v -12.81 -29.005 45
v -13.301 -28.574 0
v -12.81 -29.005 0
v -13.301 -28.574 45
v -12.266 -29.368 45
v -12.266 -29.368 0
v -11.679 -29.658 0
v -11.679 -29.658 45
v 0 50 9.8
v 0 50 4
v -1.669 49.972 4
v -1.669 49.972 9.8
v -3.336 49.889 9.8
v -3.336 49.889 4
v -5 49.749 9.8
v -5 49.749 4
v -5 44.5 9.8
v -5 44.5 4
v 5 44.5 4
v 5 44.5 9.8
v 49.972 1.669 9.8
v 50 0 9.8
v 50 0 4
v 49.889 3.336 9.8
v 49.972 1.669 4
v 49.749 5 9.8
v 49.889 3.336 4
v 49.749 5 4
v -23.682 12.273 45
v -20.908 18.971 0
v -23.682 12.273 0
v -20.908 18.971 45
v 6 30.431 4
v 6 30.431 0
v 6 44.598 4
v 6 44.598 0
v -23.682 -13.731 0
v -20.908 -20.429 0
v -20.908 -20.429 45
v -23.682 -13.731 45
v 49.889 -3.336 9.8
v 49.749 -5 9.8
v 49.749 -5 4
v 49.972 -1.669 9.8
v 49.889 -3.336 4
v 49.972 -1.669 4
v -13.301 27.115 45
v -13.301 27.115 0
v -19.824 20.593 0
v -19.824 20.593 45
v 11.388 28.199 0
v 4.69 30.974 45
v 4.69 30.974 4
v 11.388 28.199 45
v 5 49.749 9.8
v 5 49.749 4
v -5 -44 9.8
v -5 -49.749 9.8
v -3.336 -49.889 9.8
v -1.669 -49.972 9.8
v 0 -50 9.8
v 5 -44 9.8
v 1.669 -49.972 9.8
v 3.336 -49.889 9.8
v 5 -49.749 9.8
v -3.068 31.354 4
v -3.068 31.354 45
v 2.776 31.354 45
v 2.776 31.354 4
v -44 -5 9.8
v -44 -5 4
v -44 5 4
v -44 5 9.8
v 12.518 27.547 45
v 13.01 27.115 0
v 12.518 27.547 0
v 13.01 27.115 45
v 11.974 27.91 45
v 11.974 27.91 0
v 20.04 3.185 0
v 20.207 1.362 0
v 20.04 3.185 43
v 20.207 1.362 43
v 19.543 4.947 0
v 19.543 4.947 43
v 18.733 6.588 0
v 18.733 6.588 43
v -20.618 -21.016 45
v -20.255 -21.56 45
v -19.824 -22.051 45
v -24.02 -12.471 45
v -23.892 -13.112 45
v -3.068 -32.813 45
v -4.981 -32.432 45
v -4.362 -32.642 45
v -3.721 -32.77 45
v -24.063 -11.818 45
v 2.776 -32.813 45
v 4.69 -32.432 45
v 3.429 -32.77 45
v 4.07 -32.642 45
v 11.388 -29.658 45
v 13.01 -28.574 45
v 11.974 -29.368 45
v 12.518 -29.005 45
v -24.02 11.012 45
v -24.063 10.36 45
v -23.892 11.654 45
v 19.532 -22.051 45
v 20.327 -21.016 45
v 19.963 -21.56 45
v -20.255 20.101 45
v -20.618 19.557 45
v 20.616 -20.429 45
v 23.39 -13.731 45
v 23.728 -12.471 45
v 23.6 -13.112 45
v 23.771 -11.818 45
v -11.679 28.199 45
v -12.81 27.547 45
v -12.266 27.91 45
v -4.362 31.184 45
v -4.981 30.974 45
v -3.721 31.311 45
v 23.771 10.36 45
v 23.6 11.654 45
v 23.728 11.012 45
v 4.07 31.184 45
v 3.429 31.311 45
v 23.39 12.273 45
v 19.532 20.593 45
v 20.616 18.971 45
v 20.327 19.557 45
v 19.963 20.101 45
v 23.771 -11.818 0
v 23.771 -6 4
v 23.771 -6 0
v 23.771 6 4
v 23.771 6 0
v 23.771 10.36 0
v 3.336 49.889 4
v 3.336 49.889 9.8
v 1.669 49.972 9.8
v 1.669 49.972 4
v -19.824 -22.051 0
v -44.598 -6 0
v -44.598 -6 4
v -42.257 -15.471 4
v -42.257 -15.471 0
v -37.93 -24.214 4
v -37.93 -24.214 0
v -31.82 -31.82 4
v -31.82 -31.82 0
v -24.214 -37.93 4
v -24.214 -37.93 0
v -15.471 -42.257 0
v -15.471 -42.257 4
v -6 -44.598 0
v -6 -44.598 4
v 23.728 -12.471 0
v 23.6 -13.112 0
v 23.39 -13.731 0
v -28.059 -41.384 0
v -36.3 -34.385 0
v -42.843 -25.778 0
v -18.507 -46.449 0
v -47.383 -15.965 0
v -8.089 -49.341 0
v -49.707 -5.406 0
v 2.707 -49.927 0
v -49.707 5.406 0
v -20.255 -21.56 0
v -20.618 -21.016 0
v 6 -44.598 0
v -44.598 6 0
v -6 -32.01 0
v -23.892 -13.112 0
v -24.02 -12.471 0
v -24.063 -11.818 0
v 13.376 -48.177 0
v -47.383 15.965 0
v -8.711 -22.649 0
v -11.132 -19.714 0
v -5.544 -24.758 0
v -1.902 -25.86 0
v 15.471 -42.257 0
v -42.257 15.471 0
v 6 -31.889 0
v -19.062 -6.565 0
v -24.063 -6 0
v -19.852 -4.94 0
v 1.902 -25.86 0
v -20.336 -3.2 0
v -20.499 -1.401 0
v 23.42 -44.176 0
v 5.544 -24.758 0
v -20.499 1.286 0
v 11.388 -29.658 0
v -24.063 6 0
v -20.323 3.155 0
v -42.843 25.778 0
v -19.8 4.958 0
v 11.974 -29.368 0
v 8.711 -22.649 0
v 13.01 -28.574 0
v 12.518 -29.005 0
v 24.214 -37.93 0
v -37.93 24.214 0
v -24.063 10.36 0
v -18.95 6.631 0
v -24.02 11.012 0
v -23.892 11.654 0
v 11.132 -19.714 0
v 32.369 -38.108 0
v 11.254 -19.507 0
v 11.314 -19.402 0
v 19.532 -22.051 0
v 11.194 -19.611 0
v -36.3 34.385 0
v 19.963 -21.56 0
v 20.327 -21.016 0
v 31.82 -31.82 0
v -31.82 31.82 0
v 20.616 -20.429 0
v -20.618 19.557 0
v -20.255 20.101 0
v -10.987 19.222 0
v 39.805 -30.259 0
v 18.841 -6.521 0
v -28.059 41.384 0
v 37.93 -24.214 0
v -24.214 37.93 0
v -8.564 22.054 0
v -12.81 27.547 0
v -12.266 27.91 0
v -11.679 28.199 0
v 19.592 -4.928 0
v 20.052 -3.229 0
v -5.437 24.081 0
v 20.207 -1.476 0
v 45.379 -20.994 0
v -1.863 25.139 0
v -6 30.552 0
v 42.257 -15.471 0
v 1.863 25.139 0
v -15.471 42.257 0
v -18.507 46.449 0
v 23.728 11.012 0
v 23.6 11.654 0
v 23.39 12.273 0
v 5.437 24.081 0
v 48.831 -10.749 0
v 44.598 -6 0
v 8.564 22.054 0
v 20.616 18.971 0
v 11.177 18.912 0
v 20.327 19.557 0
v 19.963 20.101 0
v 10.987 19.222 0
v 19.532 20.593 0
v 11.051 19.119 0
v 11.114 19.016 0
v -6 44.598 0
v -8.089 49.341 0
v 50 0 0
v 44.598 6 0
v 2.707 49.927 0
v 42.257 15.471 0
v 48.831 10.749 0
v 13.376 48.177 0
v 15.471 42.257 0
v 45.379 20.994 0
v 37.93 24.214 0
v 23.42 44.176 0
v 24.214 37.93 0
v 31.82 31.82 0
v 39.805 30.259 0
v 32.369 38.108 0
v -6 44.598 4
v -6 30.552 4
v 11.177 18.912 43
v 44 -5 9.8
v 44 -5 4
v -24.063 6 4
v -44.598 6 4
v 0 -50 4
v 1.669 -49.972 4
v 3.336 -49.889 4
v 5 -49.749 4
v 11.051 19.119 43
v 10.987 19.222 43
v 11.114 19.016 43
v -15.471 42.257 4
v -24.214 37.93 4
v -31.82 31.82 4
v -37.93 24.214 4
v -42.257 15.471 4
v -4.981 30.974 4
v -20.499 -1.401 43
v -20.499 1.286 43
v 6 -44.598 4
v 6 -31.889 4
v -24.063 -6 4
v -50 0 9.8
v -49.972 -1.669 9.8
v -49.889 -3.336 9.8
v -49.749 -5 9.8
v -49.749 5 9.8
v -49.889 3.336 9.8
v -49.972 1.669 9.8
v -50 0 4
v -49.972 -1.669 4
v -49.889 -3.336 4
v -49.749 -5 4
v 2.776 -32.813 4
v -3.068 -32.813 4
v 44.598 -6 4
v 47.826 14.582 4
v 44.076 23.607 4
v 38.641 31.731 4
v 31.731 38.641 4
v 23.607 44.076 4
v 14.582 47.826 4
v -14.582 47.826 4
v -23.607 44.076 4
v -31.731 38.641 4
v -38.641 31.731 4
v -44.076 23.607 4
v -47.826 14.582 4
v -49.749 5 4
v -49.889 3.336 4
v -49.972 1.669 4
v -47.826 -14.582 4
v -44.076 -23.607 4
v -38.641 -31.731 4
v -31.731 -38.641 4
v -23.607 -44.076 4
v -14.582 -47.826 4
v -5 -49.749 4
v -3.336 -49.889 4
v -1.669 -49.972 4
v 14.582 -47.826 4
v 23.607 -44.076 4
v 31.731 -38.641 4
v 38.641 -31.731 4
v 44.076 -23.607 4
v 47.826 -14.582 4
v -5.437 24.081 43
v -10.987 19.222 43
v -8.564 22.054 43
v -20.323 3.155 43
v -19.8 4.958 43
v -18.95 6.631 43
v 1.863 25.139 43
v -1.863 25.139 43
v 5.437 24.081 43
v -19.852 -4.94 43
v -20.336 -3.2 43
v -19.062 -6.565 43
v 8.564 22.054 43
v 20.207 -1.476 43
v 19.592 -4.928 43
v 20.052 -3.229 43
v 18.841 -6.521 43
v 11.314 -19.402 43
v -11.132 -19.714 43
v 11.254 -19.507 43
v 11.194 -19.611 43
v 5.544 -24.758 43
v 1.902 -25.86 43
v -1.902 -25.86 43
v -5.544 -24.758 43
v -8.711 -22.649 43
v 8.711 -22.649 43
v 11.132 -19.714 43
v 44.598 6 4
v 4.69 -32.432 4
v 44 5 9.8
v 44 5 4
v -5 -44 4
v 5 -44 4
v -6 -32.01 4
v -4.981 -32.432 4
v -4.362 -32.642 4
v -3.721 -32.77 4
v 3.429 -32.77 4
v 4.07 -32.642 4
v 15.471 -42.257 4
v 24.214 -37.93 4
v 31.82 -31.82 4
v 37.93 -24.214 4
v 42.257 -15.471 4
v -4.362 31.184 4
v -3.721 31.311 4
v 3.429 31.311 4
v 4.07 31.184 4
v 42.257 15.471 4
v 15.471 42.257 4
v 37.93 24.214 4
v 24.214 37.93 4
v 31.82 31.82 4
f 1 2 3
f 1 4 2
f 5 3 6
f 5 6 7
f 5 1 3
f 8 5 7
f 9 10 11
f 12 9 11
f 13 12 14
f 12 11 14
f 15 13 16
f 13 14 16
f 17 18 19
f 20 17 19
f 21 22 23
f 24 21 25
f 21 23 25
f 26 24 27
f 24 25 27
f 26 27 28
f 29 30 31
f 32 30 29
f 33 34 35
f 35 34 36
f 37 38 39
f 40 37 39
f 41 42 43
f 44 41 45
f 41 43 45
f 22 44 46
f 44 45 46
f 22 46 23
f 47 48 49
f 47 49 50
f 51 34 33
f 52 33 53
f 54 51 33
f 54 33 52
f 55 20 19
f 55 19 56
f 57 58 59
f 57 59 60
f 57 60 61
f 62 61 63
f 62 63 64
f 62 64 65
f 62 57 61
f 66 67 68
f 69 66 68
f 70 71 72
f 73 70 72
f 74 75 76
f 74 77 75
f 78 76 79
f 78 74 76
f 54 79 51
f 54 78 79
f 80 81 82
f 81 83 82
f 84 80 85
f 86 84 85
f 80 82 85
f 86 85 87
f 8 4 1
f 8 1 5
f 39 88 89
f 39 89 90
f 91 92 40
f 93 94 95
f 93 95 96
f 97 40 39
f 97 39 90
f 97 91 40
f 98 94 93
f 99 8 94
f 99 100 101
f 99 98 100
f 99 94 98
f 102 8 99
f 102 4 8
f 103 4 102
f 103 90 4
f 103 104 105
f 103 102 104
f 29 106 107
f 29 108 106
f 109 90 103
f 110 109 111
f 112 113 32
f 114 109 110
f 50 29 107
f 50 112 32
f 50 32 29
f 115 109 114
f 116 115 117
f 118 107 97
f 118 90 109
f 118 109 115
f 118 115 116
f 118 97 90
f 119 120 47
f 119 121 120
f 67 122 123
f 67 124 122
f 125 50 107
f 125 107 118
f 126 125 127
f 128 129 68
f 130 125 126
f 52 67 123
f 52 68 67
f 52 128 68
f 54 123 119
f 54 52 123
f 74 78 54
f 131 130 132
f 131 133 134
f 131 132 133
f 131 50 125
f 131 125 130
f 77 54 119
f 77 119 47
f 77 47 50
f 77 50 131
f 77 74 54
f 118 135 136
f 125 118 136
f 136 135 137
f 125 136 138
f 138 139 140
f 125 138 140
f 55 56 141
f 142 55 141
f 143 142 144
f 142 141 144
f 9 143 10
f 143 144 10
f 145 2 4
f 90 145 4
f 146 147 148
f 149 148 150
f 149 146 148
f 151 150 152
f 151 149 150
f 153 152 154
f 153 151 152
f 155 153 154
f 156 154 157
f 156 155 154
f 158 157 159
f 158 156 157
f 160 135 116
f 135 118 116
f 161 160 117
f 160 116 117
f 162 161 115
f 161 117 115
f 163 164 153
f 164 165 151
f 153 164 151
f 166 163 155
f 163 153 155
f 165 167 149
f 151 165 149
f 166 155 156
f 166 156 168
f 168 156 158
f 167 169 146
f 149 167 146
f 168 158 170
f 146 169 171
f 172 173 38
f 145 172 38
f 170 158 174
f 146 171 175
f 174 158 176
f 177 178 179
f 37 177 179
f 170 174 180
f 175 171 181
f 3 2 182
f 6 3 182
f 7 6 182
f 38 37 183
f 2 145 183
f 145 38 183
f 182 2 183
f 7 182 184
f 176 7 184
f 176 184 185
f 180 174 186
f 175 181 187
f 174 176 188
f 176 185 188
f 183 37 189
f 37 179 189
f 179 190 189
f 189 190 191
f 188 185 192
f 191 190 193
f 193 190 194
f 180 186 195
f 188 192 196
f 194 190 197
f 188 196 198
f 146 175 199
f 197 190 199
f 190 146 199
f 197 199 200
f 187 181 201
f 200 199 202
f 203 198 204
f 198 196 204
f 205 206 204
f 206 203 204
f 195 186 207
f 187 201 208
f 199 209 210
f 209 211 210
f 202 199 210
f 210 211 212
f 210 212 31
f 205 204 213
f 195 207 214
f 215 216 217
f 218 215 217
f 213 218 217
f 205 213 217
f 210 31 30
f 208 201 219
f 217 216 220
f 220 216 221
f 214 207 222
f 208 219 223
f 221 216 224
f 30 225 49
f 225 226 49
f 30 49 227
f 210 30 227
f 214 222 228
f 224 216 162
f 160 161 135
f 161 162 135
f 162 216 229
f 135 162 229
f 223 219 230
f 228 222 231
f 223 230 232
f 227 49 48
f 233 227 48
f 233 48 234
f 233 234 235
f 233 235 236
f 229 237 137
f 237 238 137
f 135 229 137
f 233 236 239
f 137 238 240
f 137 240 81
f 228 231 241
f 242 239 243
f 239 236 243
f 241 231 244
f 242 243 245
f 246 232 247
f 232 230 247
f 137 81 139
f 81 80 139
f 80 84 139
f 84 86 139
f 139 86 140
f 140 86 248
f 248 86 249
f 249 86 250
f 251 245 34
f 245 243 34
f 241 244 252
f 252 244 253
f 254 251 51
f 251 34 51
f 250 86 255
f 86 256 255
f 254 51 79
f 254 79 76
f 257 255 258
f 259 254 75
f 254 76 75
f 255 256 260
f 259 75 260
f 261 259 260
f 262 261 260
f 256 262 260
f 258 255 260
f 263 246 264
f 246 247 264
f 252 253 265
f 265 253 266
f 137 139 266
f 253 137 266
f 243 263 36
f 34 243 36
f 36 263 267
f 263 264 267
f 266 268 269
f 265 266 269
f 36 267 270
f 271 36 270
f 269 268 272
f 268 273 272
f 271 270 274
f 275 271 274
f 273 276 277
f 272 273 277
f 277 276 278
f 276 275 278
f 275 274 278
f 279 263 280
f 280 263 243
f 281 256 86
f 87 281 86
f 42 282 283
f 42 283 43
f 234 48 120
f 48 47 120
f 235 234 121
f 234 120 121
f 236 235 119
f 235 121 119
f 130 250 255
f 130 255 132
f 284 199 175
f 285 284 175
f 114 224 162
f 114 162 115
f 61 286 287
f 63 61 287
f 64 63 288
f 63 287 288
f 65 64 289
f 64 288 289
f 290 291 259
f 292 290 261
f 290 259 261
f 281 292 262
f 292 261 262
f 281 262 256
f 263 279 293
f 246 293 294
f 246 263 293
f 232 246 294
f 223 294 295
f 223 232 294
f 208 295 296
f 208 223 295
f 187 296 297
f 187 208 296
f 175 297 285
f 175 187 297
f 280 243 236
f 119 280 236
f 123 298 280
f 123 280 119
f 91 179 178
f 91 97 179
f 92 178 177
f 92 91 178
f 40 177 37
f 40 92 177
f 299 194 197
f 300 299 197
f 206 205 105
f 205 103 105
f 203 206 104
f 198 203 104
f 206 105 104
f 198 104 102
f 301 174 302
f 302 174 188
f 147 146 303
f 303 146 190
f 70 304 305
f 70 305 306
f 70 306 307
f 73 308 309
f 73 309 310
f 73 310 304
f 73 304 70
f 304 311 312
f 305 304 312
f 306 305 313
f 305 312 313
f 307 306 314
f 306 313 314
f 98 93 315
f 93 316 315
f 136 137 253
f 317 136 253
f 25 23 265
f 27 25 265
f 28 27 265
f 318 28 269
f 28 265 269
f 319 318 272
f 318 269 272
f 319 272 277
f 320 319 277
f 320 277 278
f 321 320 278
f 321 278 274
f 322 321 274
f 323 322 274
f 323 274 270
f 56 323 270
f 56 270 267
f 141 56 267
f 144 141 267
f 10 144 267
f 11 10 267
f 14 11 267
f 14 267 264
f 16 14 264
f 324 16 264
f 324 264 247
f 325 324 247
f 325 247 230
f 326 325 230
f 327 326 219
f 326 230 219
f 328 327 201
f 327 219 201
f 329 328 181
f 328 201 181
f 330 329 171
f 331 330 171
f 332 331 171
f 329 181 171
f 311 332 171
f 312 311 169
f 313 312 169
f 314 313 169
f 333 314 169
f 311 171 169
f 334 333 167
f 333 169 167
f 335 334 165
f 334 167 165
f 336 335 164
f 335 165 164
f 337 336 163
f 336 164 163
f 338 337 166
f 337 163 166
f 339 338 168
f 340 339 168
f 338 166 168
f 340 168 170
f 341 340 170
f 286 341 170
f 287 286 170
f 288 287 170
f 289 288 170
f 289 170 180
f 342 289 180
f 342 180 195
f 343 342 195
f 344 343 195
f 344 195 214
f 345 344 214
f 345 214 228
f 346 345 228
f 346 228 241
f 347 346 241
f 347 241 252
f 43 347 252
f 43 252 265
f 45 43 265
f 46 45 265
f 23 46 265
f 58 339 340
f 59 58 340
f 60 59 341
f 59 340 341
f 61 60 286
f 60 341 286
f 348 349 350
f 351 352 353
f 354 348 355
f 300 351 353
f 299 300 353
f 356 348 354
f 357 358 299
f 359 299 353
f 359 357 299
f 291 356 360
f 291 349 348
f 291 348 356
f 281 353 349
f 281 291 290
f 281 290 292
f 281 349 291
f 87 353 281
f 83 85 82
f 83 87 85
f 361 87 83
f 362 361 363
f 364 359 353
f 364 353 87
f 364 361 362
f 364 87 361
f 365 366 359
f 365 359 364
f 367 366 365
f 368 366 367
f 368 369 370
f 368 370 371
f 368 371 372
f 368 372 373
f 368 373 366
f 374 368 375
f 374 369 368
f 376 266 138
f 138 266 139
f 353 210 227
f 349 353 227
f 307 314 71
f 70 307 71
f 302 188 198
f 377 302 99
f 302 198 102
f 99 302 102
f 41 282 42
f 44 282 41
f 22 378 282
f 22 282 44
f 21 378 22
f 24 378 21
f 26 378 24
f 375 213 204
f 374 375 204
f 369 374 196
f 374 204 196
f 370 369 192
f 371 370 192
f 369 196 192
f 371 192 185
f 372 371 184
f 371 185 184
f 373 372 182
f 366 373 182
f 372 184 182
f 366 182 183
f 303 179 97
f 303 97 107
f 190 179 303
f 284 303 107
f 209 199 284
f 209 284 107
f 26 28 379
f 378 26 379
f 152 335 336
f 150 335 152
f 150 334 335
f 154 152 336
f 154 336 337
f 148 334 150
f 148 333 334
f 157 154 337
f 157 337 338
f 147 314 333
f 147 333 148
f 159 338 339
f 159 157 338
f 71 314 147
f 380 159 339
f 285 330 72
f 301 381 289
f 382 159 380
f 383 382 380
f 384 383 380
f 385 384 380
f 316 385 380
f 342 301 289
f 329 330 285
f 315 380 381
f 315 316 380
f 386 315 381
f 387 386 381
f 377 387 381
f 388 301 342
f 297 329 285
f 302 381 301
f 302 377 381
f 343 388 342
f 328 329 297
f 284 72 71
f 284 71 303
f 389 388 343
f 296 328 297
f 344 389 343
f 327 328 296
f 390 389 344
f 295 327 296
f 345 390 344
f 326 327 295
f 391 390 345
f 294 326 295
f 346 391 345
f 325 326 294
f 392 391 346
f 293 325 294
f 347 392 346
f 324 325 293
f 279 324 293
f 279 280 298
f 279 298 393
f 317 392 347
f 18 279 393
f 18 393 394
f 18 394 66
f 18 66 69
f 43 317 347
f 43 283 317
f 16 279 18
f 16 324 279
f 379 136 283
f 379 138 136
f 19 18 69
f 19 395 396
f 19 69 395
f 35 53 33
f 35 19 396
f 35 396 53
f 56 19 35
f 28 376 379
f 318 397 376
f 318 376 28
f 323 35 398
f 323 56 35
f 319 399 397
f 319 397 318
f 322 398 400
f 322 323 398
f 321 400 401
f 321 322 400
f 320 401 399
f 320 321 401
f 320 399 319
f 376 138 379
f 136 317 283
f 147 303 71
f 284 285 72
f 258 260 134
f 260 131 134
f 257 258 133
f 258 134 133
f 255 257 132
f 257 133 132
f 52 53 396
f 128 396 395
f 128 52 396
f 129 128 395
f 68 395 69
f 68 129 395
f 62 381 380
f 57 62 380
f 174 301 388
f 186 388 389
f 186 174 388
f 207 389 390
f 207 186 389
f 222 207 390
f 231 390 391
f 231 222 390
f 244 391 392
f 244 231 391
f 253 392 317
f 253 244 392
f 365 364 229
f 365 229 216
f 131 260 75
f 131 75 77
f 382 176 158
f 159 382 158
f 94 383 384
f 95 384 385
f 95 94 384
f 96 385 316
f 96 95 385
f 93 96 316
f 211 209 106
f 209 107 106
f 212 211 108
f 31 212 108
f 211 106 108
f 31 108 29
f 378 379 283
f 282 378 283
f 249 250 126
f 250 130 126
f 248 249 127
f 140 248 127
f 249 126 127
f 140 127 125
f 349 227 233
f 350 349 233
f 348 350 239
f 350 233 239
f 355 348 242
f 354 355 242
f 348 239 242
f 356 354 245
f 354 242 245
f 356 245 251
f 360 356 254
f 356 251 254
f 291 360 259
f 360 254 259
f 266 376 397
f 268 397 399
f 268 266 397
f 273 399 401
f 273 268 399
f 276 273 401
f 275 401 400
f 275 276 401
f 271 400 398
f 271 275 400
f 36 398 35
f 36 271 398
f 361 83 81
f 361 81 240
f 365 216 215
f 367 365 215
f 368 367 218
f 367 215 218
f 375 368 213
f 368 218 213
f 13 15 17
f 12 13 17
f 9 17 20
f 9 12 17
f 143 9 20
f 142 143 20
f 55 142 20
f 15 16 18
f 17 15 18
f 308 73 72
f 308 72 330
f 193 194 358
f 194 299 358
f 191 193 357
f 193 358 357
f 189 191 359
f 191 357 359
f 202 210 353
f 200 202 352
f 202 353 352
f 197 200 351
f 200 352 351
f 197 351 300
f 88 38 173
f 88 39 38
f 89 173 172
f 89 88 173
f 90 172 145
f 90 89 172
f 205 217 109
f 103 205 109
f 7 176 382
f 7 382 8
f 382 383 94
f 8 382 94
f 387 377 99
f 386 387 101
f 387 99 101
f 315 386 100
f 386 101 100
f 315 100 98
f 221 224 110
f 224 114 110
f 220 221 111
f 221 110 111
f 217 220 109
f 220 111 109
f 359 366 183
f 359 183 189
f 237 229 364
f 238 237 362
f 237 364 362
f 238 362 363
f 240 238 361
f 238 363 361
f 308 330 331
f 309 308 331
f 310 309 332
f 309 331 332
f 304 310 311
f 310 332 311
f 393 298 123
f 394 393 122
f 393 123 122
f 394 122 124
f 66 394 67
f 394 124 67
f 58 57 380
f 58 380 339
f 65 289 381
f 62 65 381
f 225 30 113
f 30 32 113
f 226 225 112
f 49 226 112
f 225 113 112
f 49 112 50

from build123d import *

# Parameters (mm, degrees)
F0_R      = 50
F1_DEPTH  = 4
F3_DEPTH  = 5.8
F4_DEPTH  = 5.8
F5_DEPTH  = 5.8
F6_R      = 45
F7_DEPTH  = 4
F8_W      = 6
F8_H      = 6
F9_DEPTH  = 4
F10_R     = 22.5
F11_DEPTH = 25
F12_W     = 47.8333383799
F12_H     = 64.1666669399
F13_DEPTH = 45
F14_SIZE  = 15
F15_SIZE  = 5
F16_R     = 5
F18_DEPTH = 43
F19_R     = 10


with BuildPart() as f1:
    # F0 (on Top) → F1 (new body)
    with BuildSketch(Plane.XY):
        Circle(F0_R)
    extrude(amount=F1_DEPTH)

    # F2 (on face) → F3 (join)
    with BuildSketch(Plane.XY.offset(4)):
        with BuildLine():
            ThreePointArc((5, 49.7493718553), (2.503138753, 49.9373036555), (0, 50))
            ThreePointArc((0, 50), (-2.503138753, 49.9373036555), (-5, 49.7493718553))
            Line((-5, 49.7493718553), (-5, 44.5003296036))
            Line((-5, 44.5003296036), (5, 44.5003296036))
            Line((5, 44.5003296036), (5, 49.7493718553))
        make_face()
    extrude(amount=F3_DEPTH)

    # F2 (on face) → F4 (join)
    with BuildSketch(Plane.XY.offset(4)):
        with BuildLine():
            ThreePointArc((0, -50), (2.503138753, -49.9373036555), (5, -49.7493718553))
            Line((5, -49.7493718553), (5, -44))
            Line((5, -44), (-5, -44))
            Line((-5, -44), (-5, -49.7493718553))
            ThreePointArc((-5, -49.7493718553), (-2.503138753, -49.9373036555), (0, -50))
        make_face()
    extrude(amount=F4_DEPTH)

    # F2 (on face) → F5 (join)
    with BuildSketch(Plane.XY.offset(4)):
        with BuildLine():
            Line((-44, 5), (-49.7493718553, 5))
            ThreePointArc((-49.7493718553, 5), (-49.9373036555, 2.503138753), (-50, 0))
            ThreePointArc((-50, 0), (-49.9373036555, -2.503138753), (-49.7493718553, -5))
            Line((-49.7493718553, -5), (-44, -5))
            Line((-44, -5), (-44, 5))
        make_face()
        with BuildLine():
            ThreePointArc((50, 0), (49.9373036555, 2.503138753), (49.7493718553, 5))
            Line((49.7493718553, 5), (44, 5))
            Line((44, 5), (44, -5))
            Line((44, -5), (49.7493718553, -5))
            ThreePointArc((49.7493718553, -5), (49.9373036555, -2.503138753), (50, 0))
        make_face()
    extrude(amount=F5_DEPTH)

    # F6 (on Top) → F7 (cut)
    with BuildSketch(Plane.XY):
        Circle(F6_R)
    extrude(amount=F7_DEPTH, mode=Mode.SUBTRACT)

    # F8 (on Top) → F9 (join)
    with BuildSketch(Plane.XY):
        Polygon((6, 46.8811020255), (-6, 46.8811020255), (-6, 6), (0, 6), (6, 6), align=None)
        with Locations((-3, 3)):
            Rectangle(F8_W, F8_H)
        Polygon((-6, 0), (-6, 6), (-46.5700030327, 6), (-46.5700030327, -6), (-6, -6), align=None)
        Polygon((46.8255914748, 6), (6, 6), (6, 0), (6, -6), (46.8255914748, -6), align=None)
        with Locations((3, 3)):
            Rectangle(F8_W, F8_H)
        with Locations((-3, -3)):
            Rectangle(F8_W, F8_H)
        with Locations((3, -3)):
            Rectangle(F8_W, F8_H)
        Polygon((0, -6), (-6, -6), (-6, -46.7753745615), (6, -46.7753745615), (6, -6), align=None)
    extrude(amount=F9_DEPTH)

    # F10 (on face) → F11 (cut)
    with BuildSketch(Plane(origin=(0, 0, 0), x_dir=(1, 0, 0), z_dir=(0, 0, -1))):
        Circle(F10_R)
    extrude(amount=-F11_DEPTH, mode=Mode.SUBTRACT)

    # F12 (on Top) → F13 (join)
    with BuildSketch(Plane.XY):
        with Locations((-0.1458320767, -0.7291669026)):
            Rectangle(F12_W, F12_H)
    extrude(amount=F13_DEPTH)

    # F14
    f14_edges = [f1.edges().sort_by_distance(p)[0] for p in [
        (-24.062501, 31.354167, 22.5),
        (23.770837, 31.354167, 22.5),
        (23.770837, -32.8125, 22.5),
        (-24.062501, -32.8125, 22.5),
    ]]
    chamfer(f14_edges, length=F14_SIZE)

    # F15
    f15_edges = [f1.edges().sort_by_distance(p)[0] for p in [
        (-9.062501, 31.354167, 22.5),
        (8.770837, 31.354167, 22.5),
        (-24.062501, -17.8125, 22.5),
        (-9.062501, -32.8125, 22.5),
        (8.770837, -32.8125, 22.5),
        (23.770837, -17.8125, 22.5),
        (23.770837, 16.354167, 22.5),
        (-24.062501, 16.354167, 22.5),
    ]]
    chamfer(f15_edges, length=F15_SIZE)

    # F16
    f16_edges = [f1.edges().sort_by_distance(p)[0] for p in [
        (-24.062501, 11.354167, 22.5),
        (-20.526967, 19.8897, 22.5),
        (-12.598035, 27.818633, 22.5),
        (-4.062501, 31.354167, 24.5),
        (3.770837, 31.354167, 24.5),
        (12.306371, 27.818633, 22.5),
        (20.235303, 19.8897, 22.5),
        (23.770837, 11.354167, 22.5),
        (23.770837, -12.8125, 22.5),
        (20.235303, -21.348034, 22.5),
        (12.306371, -29.276966, 22.5),
        (3.770837, -32.8125, 24.5),
        (-4.062501, -32.8125, 24.5),
        (-24.062501, -12.8125, 22.5),
        (-20.526967, -21.348034, 22.5),
        (-12.598035, -29.276966, 22.5),
    ]]
    fillet(f16_edges, radius=F16_R)

    # F17 (on face) → F18 (cut)
    with BuildSketch(Plane(origin=(0, 0, 0), x_dir=(1, 0, 0), z_dir=(0, 0, -1))):
        with BuildLine():
            Line((11.3142130134, 19.4022327268), (11.1320833255, 19.7139199305))
            ThreePointArc((11.1320833255, 19.7139199305), (0, 26), (-11.1320833255, 19.7139199305))
            ThreePointArc((-11.1320833255, 19.7139199305), (-11.9963062924, 7.9911443085), (-3.0526367469, 0.3634890539))
            ThreePointArc((-3.0526367469, 0.3634890539), (0, 0.7269781077), (3.0526367469, 0.3634890539))
            ThreePointArc((3.0526367469, 0.3634890539), (10.2147999909, 4.9589887983), (13, 13))
            ThreePointArc((13, 13), (12.5714909453, 16.3102289065), (11.3142130134, 19.4022327268))
        make_face()
        with BuildLine():
            ThreePointArc((11.3142130134, 19.4022327268), (11.2242301322, 19.5587085572), (11.1320833255, 19.7139199305))
            Line((11.1320833255, 19.7139199305), (11.3142130134, 19.4022327268))
        make_face()
        with BuildLine():
            ThreePointArc((-3.0526367469, 0.3634890539), (-11.9963062924, 7.9911443085), (-11.1320833255, 19.7139199305))
            Line((-11.1320833255, 19.7139199305), (-20.499, 4.1830083316))
            Line((-20.499, 4.1830083316), (-20.499, -4.1830083316))
            Line((-20.499, -4.1830083316), (-10.9868011053, -19.2221370497))
            ThreePointArc((-10.9868011053, -19.2221370497), (-12.0488854783, -7.3920016371), (-3.0526367469, 0.3634890539))
        make_face()
        with BuildLine():
            Line((20.2073358467, 4.1830083316), (11.3142130134, 19.4022327268))
            ThreePointArc((11.3142130134, 19.4022327268), (12.5714909453, 16.3102289065), (13, 13))
            ThreePointArc((13, 13), (10.2147999909, 4.9589887983), (3.0526367469, 0.3634890539))
            ThreePointArc((3.0526367469, 0.3634890539), (10.2147999909, -4.2320106906), (13, -12.2730218923))
            ThreePointArc((13, -12.2730218923), (12.5358890301, -15.7156206526), (11.1766944269, -18.9124120515))
            Line((11.1766944269, -18.9124120515), (20.2073358467, -4.1830083316))
            Line((20.2073358467, -4.1830083316), (20.2073358467, 4.1830083316))
        make_face()
        with BuildLine():
            ThreePointArc((3.0526367469, 0.3634890539), (0, 0), (-3.0526367469, 0.3634890539))
            ThreePointArc((-3.0526367469, 0.3634890539), (-12.0488854783, -7.3920016371), (-10.9868011053, -19.2221370497))
            ThreePointArc((-10.9868011053, -19.2221370497), (0, -25.2730218923), (10.9868011053, -19.2221370497))
            Line((10.9868011053, -19.2221370497), (11.1766944269, -18.9124120515))
            ThreePointArc((11.1766944269, -18.9124120515), (12.5358890301, -15.7156206526), (13, -12.2730218923))
            ThreePointArc((13, -12.2730218923), (10.2147999909, -4.2320106906), (3.0526367469, 0.3634890539))
        make_face()
        with BuildLine():
            Line((11.1766944269, -18.9124120515), (10.9868011053, -19.2221370497))
            ThreePointArc((10.9868011053, -19.2221370497), (11.0828297806, -19.0679379369), (11.1766944269, -18.9124120515))
        make_face()
        with BuildLine():
            ThreePointArc((3.0526367469, 0.3634890539), (0, 0.7269781077), (-3.0526367469, 0.3634890539))
            ThreePointArc((-3.0526367469, 0.3634890539), (0, 0), (3.0526367469, 0.3634890539))
        make_face()
    extrude(amount=-F18_DEPTH, mode=Mode.SUBTRACT)

    # F19
    f19_edges = [f1.edges().sort_by_distance(p)[0] for p in [
        (-20.499, 4.183008, 21.5),
        (20.207336, 4.183008, 21.5),
        (-20.499, -4.183008, 21.5),
        (20.207336, -4.183008, 21.5),
    ]]
    fillet(f19_edges, radius=F19_R)


solid = f1.part
